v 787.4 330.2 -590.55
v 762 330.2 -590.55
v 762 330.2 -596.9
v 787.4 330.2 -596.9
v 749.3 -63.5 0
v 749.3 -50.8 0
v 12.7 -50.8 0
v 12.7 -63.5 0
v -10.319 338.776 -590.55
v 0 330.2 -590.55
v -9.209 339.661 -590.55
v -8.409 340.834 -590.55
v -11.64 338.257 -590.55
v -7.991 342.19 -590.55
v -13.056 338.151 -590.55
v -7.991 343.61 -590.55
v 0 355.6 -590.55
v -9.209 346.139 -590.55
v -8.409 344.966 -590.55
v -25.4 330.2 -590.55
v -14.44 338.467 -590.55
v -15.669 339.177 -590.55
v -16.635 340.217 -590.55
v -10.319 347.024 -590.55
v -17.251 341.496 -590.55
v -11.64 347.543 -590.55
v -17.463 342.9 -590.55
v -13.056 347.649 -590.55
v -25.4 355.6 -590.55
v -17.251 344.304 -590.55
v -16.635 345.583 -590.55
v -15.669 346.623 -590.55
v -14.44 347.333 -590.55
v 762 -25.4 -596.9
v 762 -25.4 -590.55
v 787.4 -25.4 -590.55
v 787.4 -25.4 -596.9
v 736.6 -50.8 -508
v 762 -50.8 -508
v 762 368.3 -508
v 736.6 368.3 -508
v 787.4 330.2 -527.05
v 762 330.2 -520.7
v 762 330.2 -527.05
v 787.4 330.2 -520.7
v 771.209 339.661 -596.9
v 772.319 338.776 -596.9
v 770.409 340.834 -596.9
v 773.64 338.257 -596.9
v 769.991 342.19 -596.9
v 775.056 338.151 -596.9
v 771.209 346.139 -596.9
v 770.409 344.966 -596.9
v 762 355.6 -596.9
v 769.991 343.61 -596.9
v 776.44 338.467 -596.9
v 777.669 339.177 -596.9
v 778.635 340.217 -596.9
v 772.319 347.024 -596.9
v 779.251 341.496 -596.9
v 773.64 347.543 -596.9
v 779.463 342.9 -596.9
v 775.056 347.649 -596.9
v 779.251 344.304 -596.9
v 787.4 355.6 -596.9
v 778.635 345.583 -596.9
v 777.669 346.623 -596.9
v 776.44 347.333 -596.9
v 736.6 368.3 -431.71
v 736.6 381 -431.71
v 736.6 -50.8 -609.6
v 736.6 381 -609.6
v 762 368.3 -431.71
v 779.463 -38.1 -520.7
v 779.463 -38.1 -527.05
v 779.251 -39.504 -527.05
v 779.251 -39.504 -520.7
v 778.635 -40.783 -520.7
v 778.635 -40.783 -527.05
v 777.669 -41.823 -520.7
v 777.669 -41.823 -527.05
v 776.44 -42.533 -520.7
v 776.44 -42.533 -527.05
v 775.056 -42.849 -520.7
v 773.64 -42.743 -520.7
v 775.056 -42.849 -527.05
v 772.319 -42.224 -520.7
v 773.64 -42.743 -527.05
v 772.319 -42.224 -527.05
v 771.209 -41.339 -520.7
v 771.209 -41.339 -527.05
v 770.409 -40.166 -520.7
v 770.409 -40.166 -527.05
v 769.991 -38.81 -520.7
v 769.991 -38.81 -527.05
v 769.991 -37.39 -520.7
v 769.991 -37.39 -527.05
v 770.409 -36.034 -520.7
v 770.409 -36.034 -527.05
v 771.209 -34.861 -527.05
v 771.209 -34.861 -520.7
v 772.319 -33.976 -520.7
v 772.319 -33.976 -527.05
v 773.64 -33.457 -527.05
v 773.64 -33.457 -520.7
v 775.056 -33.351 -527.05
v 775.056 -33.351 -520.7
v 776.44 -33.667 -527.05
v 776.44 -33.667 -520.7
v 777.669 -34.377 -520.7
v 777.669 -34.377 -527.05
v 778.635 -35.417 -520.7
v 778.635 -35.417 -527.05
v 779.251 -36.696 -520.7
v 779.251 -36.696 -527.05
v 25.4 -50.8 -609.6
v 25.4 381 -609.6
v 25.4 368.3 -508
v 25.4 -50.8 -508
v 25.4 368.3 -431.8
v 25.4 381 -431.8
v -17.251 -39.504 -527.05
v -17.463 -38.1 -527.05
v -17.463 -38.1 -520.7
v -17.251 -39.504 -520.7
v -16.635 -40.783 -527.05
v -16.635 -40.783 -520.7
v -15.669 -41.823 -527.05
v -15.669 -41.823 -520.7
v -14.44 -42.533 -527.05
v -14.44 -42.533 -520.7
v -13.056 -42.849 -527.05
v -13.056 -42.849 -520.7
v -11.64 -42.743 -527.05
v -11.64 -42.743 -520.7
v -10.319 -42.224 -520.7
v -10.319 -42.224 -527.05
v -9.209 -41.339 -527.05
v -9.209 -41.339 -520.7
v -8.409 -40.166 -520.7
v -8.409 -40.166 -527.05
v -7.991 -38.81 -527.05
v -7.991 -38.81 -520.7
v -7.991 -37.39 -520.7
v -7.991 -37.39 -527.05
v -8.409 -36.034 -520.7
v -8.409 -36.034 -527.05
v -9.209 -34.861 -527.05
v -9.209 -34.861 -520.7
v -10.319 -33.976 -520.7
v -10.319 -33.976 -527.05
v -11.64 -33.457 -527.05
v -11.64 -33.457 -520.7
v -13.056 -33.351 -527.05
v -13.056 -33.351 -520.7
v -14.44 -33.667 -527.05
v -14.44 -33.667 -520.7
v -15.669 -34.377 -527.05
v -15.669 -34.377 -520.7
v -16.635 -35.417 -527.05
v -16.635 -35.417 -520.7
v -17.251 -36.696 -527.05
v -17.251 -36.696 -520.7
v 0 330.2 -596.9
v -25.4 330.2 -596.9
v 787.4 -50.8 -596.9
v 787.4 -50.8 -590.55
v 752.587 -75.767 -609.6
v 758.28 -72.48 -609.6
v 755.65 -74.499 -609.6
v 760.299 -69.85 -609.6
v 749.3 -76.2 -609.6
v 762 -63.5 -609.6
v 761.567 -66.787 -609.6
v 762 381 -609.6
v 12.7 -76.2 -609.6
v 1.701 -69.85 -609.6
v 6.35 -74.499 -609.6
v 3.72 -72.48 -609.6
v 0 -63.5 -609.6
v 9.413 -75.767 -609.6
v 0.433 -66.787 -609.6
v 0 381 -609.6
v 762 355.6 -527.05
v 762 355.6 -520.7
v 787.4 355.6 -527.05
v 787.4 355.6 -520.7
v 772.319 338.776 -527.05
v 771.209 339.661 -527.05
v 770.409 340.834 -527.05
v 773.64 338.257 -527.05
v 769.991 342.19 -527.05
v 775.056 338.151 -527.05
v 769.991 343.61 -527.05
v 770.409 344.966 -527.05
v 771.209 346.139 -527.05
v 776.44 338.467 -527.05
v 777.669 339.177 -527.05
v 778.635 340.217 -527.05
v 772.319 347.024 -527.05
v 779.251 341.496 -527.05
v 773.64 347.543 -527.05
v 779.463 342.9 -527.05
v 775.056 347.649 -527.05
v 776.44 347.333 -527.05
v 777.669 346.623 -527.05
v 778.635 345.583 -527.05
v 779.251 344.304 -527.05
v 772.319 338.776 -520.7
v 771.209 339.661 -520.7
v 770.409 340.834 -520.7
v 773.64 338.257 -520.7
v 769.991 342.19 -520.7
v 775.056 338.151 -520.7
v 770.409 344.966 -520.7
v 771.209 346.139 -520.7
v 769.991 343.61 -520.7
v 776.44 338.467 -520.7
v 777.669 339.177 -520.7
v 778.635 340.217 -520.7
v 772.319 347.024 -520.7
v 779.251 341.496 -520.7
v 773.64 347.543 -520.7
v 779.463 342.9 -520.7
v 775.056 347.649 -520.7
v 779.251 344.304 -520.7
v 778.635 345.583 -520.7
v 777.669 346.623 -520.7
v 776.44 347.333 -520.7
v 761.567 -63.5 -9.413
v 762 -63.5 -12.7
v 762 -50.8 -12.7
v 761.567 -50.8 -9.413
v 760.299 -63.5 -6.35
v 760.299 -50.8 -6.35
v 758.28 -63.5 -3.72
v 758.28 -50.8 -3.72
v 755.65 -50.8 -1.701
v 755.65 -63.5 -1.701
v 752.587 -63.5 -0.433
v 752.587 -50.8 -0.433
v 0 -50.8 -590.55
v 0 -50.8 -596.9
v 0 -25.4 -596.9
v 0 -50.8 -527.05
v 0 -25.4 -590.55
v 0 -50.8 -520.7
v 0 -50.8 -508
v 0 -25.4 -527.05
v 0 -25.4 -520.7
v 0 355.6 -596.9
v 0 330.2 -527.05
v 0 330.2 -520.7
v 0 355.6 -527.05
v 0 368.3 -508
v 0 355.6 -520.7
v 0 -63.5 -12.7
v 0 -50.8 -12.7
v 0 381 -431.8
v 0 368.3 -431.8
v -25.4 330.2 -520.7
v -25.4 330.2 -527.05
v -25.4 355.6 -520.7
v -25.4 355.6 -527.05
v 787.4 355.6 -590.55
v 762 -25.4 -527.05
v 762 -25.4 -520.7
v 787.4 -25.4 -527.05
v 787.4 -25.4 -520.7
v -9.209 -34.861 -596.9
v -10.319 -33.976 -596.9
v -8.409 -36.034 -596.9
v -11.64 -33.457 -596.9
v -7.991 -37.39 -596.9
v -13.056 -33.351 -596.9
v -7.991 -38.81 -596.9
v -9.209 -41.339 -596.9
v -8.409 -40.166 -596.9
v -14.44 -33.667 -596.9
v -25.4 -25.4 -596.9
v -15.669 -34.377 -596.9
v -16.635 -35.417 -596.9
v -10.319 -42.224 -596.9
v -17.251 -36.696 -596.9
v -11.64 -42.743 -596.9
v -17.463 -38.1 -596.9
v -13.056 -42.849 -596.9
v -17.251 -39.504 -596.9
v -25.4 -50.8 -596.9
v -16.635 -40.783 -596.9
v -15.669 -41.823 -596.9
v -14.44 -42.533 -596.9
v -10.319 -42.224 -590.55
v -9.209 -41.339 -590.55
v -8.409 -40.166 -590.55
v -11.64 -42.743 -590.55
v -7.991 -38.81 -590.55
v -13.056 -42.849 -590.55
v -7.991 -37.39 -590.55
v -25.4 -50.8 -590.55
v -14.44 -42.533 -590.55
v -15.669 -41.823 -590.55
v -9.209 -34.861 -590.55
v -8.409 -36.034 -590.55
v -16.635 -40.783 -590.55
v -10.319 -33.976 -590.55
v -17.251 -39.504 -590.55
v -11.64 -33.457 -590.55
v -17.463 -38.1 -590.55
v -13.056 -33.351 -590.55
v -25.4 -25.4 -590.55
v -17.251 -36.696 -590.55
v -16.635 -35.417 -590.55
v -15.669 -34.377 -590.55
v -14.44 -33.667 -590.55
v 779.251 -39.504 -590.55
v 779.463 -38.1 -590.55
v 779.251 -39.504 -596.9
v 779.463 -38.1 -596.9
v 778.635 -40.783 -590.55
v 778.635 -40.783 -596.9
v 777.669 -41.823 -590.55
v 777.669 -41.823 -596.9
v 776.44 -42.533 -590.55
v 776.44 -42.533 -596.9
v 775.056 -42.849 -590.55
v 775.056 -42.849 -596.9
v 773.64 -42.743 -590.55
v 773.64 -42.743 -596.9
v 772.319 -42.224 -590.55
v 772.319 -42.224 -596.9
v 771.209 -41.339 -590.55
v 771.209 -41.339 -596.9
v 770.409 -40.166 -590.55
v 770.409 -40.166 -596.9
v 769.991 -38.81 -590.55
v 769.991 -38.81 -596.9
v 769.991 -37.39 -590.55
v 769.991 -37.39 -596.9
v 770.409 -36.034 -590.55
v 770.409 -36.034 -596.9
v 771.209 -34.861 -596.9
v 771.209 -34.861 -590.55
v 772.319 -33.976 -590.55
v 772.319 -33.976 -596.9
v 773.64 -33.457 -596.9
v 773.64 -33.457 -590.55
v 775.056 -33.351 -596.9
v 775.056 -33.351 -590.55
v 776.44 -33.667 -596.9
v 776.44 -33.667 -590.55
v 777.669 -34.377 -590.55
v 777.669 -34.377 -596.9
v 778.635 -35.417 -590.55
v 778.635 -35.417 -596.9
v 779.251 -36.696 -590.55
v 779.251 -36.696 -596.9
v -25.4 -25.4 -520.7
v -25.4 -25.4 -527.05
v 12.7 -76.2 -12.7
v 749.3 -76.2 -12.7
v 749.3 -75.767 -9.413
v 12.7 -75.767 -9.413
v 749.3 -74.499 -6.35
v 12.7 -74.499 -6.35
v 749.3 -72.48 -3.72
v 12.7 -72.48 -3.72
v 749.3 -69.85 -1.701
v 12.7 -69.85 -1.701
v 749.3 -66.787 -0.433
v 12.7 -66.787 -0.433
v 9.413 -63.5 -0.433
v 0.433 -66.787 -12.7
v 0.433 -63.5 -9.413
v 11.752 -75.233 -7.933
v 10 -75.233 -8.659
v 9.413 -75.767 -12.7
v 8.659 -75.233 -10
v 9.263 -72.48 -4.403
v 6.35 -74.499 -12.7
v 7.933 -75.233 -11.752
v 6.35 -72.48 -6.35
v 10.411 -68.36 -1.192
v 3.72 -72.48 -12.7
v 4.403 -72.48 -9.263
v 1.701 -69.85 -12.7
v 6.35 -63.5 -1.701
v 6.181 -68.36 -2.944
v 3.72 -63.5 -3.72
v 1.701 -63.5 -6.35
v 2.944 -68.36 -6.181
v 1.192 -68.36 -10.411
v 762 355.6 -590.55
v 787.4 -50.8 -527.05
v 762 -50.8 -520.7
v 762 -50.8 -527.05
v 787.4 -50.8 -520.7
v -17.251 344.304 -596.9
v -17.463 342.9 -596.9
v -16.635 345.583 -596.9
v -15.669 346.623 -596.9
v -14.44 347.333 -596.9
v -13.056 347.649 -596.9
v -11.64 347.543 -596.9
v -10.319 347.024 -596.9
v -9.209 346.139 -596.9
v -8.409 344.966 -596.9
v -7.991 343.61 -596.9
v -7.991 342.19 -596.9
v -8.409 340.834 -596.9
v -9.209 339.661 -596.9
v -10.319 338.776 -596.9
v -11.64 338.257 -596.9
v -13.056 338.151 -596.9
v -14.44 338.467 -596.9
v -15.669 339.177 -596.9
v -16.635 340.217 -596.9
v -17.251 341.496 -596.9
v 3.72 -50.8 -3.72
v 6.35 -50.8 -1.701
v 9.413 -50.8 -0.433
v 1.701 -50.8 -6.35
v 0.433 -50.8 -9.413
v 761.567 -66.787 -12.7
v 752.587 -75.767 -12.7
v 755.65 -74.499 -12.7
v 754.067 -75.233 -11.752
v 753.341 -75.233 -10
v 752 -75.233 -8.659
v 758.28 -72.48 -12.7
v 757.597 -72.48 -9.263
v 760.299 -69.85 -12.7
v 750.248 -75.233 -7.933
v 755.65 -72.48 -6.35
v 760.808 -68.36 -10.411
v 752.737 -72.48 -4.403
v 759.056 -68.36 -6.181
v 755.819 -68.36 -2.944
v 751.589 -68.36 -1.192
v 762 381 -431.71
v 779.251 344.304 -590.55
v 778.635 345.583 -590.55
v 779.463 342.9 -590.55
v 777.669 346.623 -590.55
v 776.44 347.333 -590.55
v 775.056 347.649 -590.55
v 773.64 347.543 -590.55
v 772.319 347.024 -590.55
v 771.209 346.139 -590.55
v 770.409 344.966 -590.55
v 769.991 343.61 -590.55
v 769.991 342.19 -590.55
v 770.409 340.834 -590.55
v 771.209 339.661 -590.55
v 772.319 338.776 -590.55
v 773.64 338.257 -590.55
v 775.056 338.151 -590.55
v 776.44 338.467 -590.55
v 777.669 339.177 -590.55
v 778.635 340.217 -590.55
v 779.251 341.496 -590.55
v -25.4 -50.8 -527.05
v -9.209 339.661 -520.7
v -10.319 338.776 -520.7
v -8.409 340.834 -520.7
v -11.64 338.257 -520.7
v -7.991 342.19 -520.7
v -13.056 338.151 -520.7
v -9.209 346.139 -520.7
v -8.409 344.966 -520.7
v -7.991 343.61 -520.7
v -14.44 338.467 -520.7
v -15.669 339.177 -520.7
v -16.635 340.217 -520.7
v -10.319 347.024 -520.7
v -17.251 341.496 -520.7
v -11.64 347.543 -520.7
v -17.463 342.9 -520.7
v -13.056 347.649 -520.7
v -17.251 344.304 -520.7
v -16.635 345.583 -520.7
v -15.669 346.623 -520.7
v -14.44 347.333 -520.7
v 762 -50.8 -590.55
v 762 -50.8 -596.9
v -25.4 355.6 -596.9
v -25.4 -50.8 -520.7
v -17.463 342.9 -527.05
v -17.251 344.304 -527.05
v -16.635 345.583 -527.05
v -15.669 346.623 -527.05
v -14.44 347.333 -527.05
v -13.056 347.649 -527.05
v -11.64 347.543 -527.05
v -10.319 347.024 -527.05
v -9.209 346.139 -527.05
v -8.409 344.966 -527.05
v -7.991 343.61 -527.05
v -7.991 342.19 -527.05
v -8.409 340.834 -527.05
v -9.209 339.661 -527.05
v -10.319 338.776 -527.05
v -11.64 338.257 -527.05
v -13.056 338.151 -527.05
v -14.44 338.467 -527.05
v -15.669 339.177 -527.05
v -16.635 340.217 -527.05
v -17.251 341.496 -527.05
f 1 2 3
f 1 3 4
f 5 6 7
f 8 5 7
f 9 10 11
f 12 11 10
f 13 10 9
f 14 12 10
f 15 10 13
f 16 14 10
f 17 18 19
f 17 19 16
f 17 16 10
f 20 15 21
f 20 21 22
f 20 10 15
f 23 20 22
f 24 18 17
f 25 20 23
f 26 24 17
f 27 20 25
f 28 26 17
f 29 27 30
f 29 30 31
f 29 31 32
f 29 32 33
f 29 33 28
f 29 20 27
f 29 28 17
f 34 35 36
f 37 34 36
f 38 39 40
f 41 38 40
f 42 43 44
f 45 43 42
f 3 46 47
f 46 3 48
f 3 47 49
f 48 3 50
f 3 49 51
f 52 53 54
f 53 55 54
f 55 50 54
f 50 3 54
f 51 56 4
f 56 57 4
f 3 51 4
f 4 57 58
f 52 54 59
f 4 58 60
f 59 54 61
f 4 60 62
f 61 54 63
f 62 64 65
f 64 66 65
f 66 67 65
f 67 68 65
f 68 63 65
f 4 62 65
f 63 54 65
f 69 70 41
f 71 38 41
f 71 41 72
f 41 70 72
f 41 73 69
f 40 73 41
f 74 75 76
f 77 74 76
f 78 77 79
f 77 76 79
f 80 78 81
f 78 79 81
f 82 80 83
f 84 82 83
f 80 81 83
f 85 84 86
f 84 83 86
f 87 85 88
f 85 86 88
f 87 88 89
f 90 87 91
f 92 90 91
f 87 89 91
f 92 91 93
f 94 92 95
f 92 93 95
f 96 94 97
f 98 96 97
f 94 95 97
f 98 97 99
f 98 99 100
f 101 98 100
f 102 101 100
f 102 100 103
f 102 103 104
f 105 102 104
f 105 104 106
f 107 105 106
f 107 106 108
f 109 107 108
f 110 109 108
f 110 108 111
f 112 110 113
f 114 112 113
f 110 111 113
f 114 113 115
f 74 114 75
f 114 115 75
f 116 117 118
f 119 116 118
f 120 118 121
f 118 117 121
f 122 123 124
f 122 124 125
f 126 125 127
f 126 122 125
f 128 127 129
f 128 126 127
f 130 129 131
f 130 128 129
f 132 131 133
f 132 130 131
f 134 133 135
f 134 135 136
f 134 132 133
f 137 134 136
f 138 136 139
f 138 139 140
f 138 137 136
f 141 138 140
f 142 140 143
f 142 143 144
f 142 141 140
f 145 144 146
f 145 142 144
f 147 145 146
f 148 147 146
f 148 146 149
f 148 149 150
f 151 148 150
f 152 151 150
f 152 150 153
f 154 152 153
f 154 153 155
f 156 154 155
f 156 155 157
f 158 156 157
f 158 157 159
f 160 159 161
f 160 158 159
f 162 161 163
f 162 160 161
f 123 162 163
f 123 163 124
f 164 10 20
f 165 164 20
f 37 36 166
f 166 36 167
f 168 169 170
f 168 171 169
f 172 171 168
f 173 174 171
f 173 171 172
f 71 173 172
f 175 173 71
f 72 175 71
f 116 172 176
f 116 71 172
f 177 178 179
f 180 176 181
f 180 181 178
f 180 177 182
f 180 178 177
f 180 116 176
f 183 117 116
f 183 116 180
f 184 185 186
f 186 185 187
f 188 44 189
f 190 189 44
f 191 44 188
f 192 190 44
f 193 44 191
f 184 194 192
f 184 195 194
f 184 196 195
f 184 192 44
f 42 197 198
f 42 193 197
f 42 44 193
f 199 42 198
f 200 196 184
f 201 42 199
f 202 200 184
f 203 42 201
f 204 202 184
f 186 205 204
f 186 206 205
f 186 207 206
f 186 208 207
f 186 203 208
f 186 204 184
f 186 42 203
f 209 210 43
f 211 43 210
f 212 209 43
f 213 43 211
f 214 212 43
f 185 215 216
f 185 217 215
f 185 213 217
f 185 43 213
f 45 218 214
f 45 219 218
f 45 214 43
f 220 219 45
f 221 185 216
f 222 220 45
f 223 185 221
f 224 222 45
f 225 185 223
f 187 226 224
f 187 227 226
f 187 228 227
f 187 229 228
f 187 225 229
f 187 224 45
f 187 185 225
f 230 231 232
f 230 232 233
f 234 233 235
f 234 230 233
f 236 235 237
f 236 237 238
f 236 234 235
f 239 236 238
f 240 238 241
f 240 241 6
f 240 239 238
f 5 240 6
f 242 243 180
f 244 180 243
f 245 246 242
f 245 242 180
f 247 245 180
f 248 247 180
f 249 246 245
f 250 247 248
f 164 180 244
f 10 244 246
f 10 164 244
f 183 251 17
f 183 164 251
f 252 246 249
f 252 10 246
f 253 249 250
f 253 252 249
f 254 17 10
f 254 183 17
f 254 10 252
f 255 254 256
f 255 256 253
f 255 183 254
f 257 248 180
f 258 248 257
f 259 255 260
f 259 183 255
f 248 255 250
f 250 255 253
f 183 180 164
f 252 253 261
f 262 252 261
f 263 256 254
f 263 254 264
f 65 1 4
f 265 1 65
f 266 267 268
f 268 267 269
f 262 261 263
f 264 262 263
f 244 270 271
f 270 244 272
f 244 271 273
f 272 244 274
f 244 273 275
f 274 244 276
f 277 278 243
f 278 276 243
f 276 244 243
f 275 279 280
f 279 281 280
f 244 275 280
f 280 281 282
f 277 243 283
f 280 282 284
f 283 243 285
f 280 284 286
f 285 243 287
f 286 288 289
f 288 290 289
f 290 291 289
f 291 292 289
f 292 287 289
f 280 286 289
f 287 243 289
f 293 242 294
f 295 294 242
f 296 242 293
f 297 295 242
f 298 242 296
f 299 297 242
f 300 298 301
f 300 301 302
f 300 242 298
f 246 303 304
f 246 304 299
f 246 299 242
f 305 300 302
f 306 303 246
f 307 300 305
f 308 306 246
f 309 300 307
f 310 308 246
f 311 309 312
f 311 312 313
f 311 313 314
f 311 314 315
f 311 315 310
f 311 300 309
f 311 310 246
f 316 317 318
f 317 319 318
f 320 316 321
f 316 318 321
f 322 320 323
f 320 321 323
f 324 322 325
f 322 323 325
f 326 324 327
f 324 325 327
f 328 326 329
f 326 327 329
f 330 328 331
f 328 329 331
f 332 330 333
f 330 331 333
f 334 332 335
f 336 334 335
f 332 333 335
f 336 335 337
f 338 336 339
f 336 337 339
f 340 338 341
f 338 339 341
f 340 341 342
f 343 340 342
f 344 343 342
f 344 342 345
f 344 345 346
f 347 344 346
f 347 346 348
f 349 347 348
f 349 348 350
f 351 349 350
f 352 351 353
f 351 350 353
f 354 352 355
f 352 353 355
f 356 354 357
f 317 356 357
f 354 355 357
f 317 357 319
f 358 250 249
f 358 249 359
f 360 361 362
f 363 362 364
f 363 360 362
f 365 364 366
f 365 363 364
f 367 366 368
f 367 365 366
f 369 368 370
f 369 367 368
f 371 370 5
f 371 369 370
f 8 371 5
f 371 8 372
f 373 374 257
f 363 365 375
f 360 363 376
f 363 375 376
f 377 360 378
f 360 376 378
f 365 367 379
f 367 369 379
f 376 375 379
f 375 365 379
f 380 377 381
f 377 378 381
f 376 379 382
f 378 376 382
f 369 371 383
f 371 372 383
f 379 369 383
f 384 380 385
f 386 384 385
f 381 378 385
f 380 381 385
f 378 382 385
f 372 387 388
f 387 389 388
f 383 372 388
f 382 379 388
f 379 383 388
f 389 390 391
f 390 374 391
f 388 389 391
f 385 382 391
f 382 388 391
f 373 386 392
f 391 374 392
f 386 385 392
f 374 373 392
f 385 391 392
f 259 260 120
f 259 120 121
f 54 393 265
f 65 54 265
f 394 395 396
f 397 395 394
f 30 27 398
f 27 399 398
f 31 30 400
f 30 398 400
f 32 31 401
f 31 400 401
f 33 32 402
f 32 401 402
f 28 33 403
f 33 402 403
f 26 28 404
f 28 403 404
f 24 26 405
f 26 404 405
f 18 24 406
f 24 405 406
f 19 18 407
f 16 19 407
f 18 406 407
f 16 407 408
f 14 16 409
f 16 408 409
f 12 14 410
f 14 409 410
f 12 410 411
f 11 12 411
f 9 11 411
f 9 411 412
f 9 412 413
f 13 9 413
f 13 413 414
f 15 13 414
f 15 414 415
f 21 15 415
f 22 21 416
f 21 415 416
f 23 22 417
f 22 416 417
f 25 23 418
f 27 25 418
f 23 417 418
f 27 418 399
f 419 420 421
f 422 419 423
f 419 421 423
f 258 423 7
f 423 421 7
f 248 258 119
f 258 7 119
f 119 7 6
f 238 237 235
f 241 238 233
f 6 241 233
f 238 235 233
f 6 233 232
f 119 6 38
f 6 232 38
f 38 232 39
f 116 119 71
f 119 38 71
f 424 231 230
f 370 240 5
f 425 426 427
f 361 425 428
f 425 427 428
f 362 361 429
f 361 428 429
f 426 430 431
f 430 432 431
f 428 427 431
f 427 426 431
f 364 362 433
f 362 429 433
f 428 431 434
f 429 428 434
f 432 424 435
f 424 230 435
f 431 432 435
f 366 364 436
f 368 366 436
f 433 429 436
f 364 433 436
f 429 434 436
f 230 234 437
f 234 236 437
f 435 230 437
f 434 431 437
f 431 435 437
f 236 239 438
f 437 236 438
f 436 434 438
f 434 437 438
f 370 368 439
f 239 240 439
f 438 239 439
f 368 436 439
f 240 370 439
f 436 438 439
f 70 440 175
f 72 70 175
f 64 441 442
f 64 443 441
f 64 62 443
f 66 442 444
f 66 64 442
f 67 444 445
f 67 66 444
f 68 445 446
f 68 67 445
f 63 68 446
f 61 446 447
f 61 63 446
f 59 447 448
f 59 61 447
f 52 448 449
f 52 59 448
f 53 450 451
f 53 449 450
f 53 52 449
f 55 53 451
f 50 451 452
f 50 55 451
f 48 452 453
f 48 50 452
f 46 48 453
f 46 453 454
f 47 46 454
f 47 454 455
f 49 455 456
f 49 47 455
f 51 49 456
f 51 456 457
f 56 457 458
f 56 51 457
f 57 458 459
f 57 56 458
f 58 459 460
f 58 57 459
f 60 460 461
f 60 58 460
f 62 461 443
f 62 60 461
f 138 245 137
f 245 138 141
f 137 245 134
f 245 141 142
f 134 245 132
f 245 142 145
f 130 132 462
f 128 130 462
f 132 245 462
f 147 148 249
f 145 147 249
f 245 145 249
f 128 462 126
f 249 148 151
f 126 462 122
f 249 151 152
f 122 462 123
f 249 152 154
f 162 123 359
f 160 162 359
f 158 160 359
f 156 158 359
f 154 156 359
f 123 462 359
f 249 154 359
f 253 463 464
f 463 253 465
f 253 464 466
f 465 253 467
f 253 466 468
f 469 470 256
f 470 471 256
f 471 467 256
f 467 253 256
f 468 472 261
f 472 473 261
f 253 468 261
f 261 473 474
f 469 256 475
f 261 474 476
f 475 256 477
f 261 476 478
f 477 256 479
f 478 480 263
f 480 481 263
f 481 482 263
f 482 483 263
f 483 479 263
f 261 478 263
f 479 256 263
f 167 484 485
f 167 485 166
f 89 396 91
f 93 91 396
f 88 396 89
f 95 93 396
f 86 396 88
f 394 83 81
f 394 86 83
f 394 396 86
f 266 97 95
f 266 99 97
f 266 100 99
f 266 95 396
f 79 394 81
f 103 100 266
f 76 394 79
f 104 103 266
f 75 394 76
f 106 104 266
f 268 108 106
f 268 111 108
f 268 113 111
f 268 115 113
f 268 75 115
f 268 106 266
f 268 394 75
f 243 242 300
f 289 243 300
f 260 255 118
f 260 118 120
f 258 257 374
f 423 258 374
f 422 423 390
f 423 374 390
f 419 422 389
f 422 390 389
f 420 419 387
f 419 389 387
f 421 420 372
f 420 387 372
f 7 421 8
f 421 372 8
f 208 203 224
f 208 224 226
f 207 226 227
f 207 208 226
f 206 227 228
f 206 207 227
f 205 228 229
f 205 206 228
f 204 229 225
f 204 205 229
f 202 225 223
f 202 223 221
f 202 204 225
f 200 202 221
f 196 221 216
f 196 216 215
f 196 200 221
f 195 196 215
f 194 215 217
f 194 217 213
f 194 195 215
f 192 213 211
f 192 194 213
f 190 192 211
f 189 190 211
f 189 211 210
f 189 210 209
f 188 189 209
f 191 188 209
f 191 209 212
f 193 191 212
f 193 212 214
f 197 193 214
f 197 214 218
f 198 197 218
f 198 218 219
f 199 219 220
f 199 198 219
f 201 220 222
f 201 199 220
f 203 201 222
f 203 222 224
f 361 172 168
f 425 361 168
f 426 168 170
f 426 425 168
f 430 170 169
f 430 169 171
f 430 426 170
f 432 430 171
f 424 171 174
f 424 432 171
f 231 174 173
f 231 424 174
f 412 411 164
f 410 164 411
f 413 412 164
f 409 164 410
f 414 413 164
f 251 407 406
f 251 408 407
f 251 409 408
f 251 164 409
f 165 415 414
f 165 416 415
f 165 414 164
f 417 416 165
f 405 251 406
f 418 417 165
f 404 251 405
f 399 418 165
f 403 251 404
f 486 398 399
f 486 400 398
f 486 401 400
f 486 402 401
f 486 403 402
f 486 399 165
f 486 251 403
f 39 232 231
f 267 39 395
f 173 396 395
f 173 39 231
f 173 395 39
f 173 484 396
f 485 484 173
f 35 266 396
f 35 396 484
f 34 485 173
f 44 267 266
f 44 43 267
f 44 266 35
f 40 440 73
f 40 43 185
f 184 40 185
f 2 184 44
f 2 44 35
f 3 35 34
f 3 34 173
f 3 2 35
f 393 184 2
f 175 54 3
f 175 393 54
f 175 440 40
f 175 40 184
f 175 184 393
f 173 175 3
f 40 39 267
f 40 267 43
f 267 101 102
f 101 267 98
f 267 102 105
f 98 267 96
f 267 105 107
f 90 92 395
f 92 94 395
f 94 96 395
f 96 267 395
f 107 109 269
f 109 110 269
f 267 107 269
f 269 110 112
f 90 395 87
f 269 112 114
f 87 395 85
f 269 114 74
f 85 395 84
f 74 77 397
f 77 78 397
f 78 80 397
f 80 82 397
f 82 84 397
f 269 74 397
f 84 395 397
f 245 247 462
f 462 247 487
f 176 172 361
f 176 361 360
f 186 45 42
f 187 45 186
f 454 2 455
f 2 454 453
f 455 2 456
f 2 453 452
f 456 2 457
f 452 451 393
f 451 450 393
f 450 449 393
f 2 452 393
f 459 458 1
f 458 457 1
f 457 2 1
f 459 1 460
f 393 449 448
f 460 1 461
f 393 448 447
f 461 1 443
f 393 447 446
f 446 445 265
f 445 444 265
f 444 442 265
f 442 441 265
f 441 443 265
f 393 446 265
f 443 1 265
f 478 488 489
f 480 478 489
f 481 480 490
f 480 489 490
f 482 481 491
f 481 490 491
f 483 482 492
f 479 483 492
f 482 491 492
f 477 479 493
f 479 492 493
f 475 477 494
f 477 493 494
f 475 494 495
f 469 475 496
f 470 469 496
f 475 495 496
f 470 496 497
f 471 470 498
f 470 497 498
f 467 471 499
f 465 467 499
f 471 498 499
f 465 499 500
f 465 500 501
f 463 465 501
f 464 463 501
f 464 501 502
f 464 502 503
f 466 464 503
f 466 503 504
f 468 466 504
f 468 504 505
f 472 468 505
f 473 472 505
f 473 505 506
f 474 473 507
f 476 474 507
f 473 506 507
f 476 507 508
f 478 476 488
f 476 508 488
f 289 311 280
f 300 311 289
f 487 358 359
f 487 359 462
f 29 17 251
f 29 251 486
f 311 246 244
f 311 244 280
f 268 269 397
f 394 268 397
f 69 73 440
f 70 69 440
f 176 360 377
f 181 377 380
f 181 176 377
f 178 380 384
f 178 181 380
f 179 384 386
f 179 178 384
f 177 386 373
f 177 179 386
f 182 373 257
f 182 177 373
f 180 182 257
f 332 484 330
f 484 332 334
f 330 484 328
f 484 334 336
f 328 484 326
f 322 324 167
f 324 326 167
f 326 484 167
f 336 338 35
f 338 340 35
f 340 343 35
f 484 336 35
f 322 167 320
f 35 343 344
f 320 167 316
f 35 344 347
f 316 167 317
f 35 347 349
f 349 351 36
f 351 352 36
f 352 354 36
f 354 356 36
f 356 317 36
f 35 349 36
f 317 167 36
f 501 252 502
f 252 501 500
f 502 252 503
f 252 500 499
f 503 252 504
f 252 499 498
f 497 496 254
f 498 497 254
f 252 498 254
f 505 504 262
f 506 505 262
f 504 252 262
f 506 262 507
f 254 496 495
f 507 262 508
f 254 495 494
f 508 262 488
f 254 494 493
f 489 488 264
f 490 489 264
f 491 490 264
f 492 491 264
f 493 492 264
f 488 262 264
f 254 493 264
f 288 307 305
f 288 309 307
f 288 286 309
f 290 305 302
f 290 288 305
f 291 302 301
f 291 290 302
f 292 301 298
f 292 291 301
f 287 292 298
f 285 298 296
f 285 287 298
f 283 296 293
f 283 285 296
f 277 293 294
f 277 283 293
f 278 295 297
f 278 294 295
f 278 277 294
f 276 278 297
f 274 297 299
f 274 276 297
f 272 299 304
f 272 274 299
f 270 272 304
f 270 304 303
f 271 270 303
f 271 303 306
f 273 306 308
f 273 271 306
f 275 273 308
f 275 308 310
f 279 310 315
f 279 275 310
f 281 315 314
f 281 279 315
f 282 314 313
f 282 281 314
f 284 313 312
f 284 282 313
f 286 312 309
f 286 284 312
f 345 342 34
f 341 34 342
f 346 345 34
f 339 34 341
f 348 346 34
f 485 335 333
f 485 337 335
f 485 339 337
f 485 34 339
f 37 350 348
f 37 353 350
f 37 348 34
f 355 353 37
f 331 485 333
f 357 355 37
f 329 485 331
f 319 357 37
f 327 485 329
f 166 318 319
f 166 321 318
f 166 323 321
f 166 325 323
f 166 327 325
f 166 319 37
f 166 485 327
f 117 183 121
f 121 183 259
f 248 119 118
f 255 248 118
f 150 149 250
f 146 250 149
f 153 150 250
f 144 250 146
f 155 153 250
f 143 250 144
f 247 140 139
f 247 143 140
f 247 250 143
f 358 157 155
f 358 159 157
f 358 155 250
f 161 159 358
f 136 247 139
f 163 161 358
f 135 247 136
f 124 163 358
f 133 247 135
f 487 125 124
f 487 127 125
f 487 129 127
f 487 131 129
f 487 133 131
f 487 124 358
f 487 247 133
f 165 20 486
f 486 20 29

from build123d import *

# Parameters (mm, degrees)
SKETCH1_W                                      = 762
SKETCH1_H                                      = 381
BASE_STRUCTURE_DEPTH                           = 609.6
SKETCH3_W                                      = 711.2
SKETCH3_H                                      = 330.2
SHELL_CUT_DEPTH                                = 584.2
SKETCH5_W                                      = 25.4
SKETCH5_H                                      = 25.4
SKETCH5_R                                      = 4.7625
STABILITY_HOLDER_CUT_FOR_TOP_DEPTH             = 38.1
SKETCH7_W                                      = 63.5
SKETCH7_H                                      = 25.4
INSUDE_CUT_OF_STABILITY_HOLDERS_DEPTH          = 25.4
SKETCH14_W                                     = 711.2
SKETCH14_H                                     = 25.4
TOP_SHELLING_DEPTH                             = 406.4
SKETCH16_W                                     = 711.2
SKETCH16_H                                     = 50.8
BOTTOM_EXTENSION_DEPTH                         = 609.6
SKETCH16_6_W                                   = 711.2
SKETCH16_6_H                                   = 25.4
SKETCH16_6_H_2                                 = 50.8
BOTTOM_SHELLING_DEPTH                          = 584.2
SKETCH17_W                                     = 63.5
SKETCH17_H                                     = 25.4
BOTTOM_STABILTY_HOLDER_SHELL_CUT_DEPTH         = 25.4
SKETCH18_W                                     = 508
SKETCH18_H                                     = 406.4
F_3_4SHELL_FRONT_CHASSIS_CUT_DEPTH             = 763
FILLET_CORNER_OF_FRONT_CHASSIS_R               = 12.7
SKETCH95_W                                     = 508
SKETCH95_H                                     = 25.4
CUT_TOP_EXTRUSION_OF_CHASSIS_DEPTH             = 763
SKETCH171_W                                    = 76.290149759
SKETCH171_H                                    = 12.7
EXTRUSION_OF_STEERING_RACK_HOLDER_DEPTH        = 25.4
SKETCH172_W                                    = 76.2
SKETCH172_H                                    = 12.7
EXTRUSION_OF_OTHER_STEERING_RACK_HOLDER_DEPTH  = 25.4
MIRRORS_STABILITY_HOLDERS_COPY_1_SKETCH_W      = 25.4
MIRRORS_STABILITY_HOLDERS_COPY_1_SKETCH_H      = 25.4
MIRRORS_STABILITY_HOLDERS_COPY_1_SKETCH_R      = 4.7625
MIRRORS_STABILITY_HOLDERS_COPY_1_DEPTH         = 38.1
SKETCH173_W                                    = 63.5
SKETCH173_H                                    = 406.4
EXTRUSION_OF_OTHER_STABILITY_HOLDERS_TOP_DEPTH = 25.4
FILLET_OF_RIGHT_CORNER_OF_FRONT_CHASSIS_R      = 12.7
FILLET_OF_BOTTOM_SIDE_OF_FRONT_CHASSIS_R       = 12.7


with BuildPart() as part:
    # Sketch1 → Base Structure (new body)
    with BuildSketch(Plane.XY):
        with Locations((381, 190.5)):
            Rectangle(SKETCH1_W, SKETCH1_H)
    extrude(amount=-BASE_STRUCTURE_DEPTH)

    # Sketch3 → Shell Cut (cut)
    with BuildSketch(Plane(origin=(0, 0, -609.6), x_dir=(-1, 0, 0), z_dir=(0, 0, -1))):
        with Locations((-381, 190.5)):
            Rectangle(SKETCH3_W, SKETCH3_H)
    extrude(amount=-SHELL_CUT_DEPTH, mode=Mode.SUBTRACT)

    # Sketch5 → Stability Holder Cut for Top (add, symmetric)
    with BuildSketch(Plane.XY.offset(-558.8)):
        with Locations((774.7, 342.9)):
            Rectangle(SKETCH5_W, SKETCH5_H)
        with Locations((774.7, 342.9)):
            Circle(SKETCH5_R, mode=Mode.SUBTRACT)
    stability_holder_cut_for_top = extrude(amount=STABILITY_HOLDER_CUT_FOR_TOP_DEPTH, both=True)

    # Sketch7 → Insude Cut of Stability Holders (cut)
    with BuildSketch(Plane(origin=(787.4, 0, 0), x_dir=(0, 0, -1), z_dir=(1, 0, 0))):
        with Locations((558.8, 342.9)):
            Rectangle(SKETCH7_W, SKETCH7_H)
    extrude(amount=-INSUDE_CUT_OF_STABILITY_HOLDERS_DEPTH, mode=Mode.SUBTRACT)

    # Sketch14 → Top Shelling (cut)
    with BuildSketch(Plane(origin=(0, 0, -609.6), x_dir=(-1, 0, 0), z_dir=(0, 0, -1))):
        with Locations((-381, 368.3)):
            Rectangle(SKETCH14_W, SKETCH14_H)
    extrude(amount=-TOP_SHELLING_DEPTH, mode=Mode.SUBTRACT)

    # Sketch16 → Bottom Extension (add)
    with BuildSketch(Plane(origin=(0, 0, -609.6), x_dir=(-1, 0, 0), z_dir=(0, 0, -1))):
        Polygon((-736.6, -50.8), (-736.6, 0), (-762, 0), (-762, -76.2), (0, -76.2), (0, 0), (-25.4, 0), (-25.4, -50.8), align=None)
        with Locations((-381, -25.4)):
            Rectangle(SKETCH16_W, SKETCH16_H)
    extrude(amount=-BOTTOM_EXTENSION_DEPTH)

    # Sketch16<6> → Bottom Shelling (cut)
    with BuildSketch(Plane(origin=(0, 0, -609.6), x_dir=(-1, 0, 0), z_dir=(0, 0, -1))):
        with Locations((-381, 12.7)):
            Rectangle(SKETCH16_6_W, SKETCH16_6_H)
        with Locations((-381, -25.4)):
            Rectangle(SKETCH16_6_W, SKETCH16_6_H_2)
    extrude(amount=-BOTTOM_SHELLING_DEPTH, mode=Mode.SUBTRACT)

    # Mirror5: Stability Holder Cut for Top across plane
    add(stability_holder_cut_for_top.mirror(Plane.ZX.offset(152.4)))

    # Sketch17 → Bottom Stabilty Holder Shell Cut (cut)
    with BuildSketch(Plane(origin=(787.4, 0, 0), x_dir=(0, 0, -1), z_dir=(1, 0, 0))):
        with Locations((558.8, -38.1)):
            Rectangle(SKETCH17_W, SKETCH17_H)
    extrude(amount=-BOTTOM_STABILTY_HOLDER_SHELL_CUT_DEPTH, mode=Mode.SUBTRACT)

    # Sketch18 → 3/4Shell Front Chassis Cut (cut, through all)
    with BuildSketch(Plane(origin=(762, 0, 0), x_dir=(0, 0, -1), z_dir=(1, 0, 0))):
        with Locations((254, 152.4)):
            Rectangle(SKETCH18_W, SKETCH18_H)
    extrude(amount=-F_3_4SHELL_FRONT_CHASSIS_CUT_DEPTH, mode=Mode.SUBTRACT)

    # Fillet Corner of Front Chassis
    fillet_corner_of_front_chassis_edges = [part.edges().sort_by_distance(p)[0] for p in [
        (762, -63.5, 0),
    ]]
    fillet(fillet_corner_of_front_chassis_edges, radius=FILLET_CORNER_OF_FRONT_CHASSIS_R)

    # Sketch95 → Cut Top Extrusion of Chassis (cut, through all)
    with BuildSketch(Plane(origin=(762, 0, 0), x_dir=(0, 0, -1), z_dir=(1, 0, 0))):
        with Locations((254, 368.3)):
            Rectangle(SKETCH95_W, SKETCH95_H)
    extrude(amount=-CUT_TOP_EXTRUSION_OF_CHASSIS_DEPTH, mode=Mode.SUBTRACT)

    # Sketch171 → Extrusion of Steering Rack Holder (add)
    with BuildSketch(Plane(origin=(762, 0, 0), x_dir=(0, 0, -1), z_dir=(1, 0, 0))):
        with Locations((469.854925121, 374.65)):
            Rectangle(SKETCH171_W, SKETCH171_H)
    extrude(amount=-EXTRUSION_OF_STEERING_RACK_HOLDER_DEPTH)

    # Sketch172 → Extrusion of Other Steering Rack Holder (add)
    with BuildSketch(Plane.ZY):
        with Locations((-469.9, 374.65)):
            Rectangle(SKETCH172_W, SKETCH172_H)
    extrude(amount=-EXTRUSION_OF_OTHER_STEERING_RACK_HOLDER_DEPTH)

    # Mirrors Stability Holders: Stability Holder Cut for Top across plane
    add(stability_holder_cut_for_top.mirror(Plane(origin=(381, 0, 0), x_dir=(0, 0, 1), z_dir=(1, 0, 0))))

    # Mirrors Stability Holders copy 1 sketch → Mirrors Stability Holders copy 1 (add, symmetric)
    with BuildSketch(Plane(origin=(762, 304.8, -558.8), x_dir=(-1, 0, 0), z_dir=(0, 0, 1))):
        with Locations((774.7, 342.9)):
            Rectangle(MIRRORS_STABILITY_HOLDERS_COPY_1_SKETCH_W, MIRRORS_STABILITY_HOLDERS_COPY_1_SKETCH_H)
        with Locations((774.7, 342.9)):
            Circle(MIRRORS_STABILITY_HOLDERS_COPY_1_SKETCH_R, mode=Mode.SUBTRACT)
    extrude(amount=MIRRORS_STABILITY_HOLDERS_COPY_1_DEPTH, both=True)

    # Sketch173 → Extrusion of Other Stability Holders Top and Bottom (cut)
    with BuildSketch(Plane.ZY.offset(25.4)):
        with Locations((-558.8, 152.4)):
            Rectangle(SKETCH173_W, SKETCH173_H)
    extrude(amount=-EXTRUSION_OF_OTHER_STABILITY_HOLDERS_TOP_DEPTH, mode=Mode.SUBTRACT)

    # Fillet of Right Corner of Front Chassis
    fillet_of_right_corner_of_front_chassis_edges = [part.edges().sort_by_distance(p)[0] for p in [
        (0, -63.5, 0),
    ]]
    fillet(fillet_of_right_corner_of_front_chassis_edges, radius=FILLET_OF_RIGHT_CORNER_OF_FRONT_CHASSIS_R)

    # Fillet of Bottom Side of Front Chassis
    fillet_of_bottom_side_of_front_chassis_edges = [part.edges().sort_by_distance(p)[0] for p in [
        (381, -76.2, 0),
        (762, -76.2, -311.15),
        (758.280256121, -76.2, -3.719743879),
        (0, -76.2, -311.15),
        (3.719743879, -76.2, -3.719743879),
    ]]
    fillet(fillet_of_bottom_side_of_front_chassis_edges, radius=FILLET_OF_BOTTOM_SIDE_OF_FRONT_CHASSIS_R)


solid = part.part
